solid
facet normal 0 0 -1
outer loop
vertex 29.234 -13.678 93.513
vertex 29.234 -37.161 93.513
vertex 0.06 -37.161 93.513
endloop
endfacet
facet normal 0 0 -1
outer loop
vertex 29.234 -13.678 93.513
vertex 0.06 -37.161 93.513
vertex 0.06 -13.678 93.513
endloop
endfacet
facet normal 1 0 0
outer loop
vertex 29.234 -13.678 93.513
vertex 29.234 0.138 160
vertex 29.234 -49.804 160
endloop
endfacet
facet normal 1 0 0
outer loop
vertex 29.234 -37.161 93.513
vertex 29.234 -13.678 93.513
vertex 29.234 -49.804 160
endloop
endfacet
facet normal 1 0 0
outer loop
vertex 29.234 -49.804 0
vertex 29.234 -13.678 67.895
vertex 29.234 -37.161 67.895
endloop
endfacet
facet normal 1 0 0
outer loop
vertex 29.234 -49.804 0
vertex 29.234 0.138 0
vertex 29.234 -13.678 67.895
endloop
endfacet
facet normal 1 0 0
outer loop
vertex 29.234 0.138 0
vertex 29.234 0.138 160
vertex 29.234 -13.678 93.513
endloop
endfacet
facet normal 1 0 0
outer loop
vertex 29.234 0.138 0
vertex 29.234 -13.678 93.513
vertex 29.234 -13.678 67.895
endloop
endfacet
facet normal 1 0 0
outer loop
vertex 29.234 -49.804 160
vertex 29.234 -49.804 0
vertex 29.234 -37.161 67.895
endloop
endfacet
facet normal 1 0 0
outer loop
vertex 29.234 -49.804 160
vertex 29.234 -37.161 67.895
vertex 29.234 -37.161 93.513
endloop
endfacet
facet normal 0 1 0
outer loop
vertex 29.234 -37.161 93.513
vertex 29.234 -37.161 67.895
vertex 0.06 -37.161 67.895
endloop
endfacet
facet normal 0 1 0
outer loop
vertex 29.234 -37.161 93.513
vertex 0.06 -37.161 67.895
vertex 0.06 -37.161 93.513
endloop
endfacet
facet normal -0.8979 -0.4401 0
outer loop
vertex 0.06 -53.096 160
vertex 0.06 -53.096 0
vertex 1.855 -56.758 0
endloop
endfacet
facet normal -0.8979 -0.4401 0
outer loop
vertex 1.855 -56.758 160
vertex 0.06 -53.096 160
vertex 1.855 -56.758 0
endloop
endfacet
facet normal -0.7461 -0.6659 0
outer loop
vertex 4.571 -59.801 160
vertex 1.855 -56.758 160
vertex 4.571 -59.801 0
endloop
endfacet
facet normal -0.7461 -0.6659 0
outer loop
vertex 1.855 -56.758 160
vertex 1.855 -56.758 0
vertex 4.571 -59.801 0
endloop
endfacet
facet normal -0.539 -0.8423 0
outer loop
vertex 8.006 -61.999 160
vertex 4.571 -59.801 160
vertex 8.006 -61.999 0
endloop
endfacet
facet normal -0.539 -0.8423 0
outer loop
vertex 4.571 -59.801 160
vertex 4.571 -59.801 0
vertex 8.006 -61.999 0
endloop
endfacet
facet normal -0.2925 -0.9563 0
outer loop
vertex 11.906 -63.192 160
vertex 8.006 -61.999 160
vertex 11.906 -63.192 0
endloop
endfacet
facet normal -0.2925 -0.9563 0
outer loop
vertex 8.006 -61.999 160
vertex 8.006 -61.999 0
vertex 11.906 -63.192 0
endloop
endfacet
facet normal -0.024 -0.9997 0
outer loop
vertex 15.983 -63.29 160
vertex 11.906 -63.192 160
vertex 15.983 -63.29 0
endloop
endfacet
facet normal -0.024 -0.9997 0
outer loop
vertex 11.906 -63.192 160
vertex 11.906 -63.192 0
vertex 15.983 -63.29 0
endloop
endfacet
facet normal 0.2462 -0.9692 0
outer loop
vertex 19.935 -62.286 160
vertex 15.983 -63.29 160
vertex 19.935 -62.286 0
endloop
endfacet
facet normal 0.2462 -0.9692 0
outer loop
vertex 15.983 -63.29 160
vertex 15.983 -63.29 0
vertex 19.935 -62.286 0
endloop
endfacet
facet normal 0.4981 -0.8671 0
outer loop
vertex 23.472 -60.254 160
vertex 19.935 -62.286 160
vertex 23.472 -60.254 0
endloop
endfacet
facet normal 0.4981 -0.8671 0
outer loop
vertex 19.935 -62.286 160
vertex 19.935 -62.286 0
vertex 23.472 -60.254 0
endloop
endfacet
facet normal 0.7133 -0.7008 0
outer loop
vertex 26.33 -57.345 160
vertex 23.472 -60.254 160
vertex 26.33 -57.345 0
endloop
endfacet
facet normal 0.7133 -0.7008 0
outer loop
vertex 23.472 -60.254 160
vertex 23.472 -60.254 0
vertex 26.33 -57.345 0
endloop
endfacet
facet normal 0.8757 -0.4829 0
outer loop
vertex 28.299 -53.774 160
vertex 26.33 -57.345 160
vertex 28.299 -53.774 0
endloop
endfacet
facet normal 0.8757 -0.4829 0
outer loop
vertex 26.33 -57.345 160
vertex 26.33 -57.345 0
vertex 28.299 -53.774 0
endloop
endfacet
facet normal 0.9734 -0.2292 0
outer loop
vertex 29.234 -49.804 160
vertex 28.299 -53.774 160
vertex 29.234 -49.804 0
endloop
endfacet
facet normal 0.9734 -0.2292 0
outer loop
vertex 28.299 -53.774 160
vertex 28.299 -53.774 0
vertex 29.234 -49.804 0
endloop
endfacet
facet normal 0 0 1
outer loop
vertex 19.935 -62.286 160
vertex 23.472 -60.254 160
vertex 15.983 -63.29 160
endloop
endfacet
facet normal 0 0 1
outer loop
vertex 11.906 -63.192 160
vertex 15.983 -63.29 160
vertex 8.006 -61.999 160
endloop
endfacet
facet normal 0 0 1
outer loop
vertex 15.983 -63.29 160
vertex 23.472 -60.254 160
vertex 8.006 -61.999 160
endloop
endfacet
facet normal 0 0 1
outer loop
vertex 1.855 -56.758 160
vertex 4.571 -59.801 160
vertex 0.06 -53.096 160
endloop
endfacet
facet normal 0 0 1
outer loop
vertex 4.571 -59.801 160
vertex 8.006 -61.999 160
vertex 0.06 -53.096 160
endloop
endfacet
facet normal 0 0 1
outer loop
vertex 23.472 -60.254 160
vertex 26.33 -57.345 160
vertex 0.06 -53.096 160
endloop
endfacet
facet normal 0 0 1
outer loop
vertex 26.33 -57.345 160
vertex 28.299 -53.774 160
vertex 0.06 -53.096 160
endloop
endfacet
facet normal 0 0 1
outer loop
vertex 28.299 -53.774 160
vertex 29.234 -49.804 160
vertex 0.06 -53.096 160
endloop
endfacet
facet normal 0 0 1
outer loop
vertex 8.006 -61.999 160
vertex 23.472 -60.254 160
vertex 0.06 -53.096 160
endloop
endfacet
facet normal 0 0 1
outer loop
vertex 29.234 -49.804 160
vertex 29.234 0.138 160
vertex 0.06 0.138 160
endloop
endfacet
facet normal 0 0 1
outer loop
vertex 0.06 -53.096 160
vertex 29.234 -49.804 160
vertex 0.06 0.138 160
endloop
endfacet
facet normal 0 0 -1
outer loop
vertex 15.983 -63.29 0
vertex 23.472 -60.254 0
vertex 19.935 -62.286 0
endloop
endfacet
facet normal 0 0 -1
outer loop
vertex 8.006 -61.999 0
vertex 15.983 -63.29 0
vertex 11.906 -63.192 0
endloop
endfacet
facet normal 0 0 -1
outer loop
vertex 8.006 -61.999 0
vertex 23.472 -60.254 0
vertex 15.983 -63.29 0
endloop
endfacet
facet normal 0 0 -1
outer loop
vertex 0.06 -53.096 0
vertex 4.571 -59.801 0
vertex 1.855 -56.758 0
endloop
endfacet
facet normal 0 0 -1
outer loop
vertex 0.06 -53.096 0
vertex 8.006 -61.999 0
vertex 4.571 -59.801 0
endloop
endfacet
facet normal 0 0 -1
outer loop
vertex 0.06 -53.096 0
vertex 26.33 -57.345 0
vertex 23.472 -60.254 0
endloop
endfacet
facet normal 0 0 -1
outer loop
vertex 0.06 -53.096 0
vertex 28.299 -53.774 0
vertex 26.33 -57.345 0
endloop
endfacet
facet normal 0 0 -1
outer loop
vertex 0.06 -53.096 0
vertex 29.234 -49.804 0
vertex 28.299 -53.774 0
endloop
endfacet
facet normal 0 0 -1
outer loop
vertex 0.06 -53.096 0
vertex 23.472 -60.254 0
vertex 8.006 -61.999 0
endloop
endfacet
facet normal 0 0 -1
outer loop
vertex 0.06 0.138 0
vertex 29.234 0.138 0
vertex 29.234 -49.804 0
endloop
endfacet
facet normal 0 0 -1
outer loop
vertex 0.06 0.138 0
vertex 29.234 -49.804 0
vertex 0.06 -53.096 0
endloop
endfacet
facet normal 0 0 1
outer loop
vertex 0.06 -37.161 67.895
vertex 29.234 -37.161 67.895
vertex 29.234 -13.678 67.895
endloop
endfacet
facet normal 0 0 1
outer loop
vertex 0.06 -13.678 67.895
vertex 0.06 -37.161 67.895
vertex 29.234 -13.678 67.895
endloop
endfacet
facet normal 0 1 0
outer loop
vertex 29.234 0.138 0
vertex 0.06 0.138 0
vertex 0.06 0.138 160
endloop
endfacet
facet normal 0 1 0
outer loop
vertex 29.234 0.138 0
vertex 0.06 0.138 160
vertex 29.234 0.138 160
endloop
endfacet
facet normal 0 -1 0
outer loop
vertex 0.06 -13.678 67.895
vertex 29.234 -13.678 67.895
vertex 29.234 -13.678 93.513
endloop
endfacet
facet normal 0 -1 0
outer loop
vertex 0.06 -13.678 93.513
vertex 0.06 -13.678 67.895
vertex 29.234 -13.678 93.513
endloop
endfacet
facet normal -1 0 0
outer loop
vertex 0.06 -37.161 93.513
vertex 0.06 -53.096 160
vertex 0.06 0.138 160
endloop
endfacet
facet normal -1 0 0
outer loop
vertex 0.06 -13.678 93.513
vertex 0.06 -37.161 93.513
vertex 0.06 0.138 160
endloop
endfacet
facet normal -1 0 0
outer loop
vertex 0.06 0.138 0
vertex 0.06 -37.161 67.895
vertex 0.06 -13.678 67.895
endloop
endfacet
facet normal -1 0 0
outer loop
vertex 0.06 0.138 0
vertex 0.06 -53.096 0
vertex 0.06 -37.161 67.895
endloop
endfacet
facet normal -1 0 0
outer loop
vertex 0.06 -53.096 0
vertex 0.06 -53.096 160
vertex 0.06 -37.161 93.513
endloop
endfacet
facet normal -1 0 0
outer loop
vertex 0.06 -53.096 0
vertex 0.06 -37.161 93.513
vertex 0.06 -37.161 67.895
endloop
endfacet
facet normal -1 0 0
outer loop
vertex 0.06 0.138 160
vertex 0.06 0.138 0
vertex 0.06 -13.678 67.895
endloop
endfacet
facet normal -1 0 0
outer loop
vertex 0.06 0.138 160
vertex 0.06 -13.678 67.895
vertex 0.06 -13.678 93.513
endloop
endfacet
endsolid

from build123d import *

# Parameters (mm, degrees)
PAD_DEPTH    = 160
SKETCH001_W  = 23.4827
SKETCH001_H  = 25.6175
POCKET_DEPTH = 29.1745


with BuildPart() as part:
    # Sketch → Pad (new body)
    with BuildSketch(Plane.XY):
        with BuildLine():
            Line((0.060026, 0.138063), (29.233526, 0.138063))
            Line((29.233526, 0.138063), (29.233526, -49.804137))
            ThreePointArc((0.060026, -53.095937), (15.982721, -63.289822), (29.233526, -49.804137))
            Line((0.060026, -53.095937), (0.060026, 0.138063))
        make_face()
    extrude(amount=PAD_DEPTH)

    # Sketch001 → Pocket (cut, through all)
    with BuildSketch(Plane.YZ.offset(29.233526)):
        with Locations((-25.419298, 80.703762)):
            Rectangle(SKETCH001_W, SKETCH001_H)
    extrude(amount=-POCKET_DEPTH, mode=Mode.SUBTRACT)


solid = part.part
